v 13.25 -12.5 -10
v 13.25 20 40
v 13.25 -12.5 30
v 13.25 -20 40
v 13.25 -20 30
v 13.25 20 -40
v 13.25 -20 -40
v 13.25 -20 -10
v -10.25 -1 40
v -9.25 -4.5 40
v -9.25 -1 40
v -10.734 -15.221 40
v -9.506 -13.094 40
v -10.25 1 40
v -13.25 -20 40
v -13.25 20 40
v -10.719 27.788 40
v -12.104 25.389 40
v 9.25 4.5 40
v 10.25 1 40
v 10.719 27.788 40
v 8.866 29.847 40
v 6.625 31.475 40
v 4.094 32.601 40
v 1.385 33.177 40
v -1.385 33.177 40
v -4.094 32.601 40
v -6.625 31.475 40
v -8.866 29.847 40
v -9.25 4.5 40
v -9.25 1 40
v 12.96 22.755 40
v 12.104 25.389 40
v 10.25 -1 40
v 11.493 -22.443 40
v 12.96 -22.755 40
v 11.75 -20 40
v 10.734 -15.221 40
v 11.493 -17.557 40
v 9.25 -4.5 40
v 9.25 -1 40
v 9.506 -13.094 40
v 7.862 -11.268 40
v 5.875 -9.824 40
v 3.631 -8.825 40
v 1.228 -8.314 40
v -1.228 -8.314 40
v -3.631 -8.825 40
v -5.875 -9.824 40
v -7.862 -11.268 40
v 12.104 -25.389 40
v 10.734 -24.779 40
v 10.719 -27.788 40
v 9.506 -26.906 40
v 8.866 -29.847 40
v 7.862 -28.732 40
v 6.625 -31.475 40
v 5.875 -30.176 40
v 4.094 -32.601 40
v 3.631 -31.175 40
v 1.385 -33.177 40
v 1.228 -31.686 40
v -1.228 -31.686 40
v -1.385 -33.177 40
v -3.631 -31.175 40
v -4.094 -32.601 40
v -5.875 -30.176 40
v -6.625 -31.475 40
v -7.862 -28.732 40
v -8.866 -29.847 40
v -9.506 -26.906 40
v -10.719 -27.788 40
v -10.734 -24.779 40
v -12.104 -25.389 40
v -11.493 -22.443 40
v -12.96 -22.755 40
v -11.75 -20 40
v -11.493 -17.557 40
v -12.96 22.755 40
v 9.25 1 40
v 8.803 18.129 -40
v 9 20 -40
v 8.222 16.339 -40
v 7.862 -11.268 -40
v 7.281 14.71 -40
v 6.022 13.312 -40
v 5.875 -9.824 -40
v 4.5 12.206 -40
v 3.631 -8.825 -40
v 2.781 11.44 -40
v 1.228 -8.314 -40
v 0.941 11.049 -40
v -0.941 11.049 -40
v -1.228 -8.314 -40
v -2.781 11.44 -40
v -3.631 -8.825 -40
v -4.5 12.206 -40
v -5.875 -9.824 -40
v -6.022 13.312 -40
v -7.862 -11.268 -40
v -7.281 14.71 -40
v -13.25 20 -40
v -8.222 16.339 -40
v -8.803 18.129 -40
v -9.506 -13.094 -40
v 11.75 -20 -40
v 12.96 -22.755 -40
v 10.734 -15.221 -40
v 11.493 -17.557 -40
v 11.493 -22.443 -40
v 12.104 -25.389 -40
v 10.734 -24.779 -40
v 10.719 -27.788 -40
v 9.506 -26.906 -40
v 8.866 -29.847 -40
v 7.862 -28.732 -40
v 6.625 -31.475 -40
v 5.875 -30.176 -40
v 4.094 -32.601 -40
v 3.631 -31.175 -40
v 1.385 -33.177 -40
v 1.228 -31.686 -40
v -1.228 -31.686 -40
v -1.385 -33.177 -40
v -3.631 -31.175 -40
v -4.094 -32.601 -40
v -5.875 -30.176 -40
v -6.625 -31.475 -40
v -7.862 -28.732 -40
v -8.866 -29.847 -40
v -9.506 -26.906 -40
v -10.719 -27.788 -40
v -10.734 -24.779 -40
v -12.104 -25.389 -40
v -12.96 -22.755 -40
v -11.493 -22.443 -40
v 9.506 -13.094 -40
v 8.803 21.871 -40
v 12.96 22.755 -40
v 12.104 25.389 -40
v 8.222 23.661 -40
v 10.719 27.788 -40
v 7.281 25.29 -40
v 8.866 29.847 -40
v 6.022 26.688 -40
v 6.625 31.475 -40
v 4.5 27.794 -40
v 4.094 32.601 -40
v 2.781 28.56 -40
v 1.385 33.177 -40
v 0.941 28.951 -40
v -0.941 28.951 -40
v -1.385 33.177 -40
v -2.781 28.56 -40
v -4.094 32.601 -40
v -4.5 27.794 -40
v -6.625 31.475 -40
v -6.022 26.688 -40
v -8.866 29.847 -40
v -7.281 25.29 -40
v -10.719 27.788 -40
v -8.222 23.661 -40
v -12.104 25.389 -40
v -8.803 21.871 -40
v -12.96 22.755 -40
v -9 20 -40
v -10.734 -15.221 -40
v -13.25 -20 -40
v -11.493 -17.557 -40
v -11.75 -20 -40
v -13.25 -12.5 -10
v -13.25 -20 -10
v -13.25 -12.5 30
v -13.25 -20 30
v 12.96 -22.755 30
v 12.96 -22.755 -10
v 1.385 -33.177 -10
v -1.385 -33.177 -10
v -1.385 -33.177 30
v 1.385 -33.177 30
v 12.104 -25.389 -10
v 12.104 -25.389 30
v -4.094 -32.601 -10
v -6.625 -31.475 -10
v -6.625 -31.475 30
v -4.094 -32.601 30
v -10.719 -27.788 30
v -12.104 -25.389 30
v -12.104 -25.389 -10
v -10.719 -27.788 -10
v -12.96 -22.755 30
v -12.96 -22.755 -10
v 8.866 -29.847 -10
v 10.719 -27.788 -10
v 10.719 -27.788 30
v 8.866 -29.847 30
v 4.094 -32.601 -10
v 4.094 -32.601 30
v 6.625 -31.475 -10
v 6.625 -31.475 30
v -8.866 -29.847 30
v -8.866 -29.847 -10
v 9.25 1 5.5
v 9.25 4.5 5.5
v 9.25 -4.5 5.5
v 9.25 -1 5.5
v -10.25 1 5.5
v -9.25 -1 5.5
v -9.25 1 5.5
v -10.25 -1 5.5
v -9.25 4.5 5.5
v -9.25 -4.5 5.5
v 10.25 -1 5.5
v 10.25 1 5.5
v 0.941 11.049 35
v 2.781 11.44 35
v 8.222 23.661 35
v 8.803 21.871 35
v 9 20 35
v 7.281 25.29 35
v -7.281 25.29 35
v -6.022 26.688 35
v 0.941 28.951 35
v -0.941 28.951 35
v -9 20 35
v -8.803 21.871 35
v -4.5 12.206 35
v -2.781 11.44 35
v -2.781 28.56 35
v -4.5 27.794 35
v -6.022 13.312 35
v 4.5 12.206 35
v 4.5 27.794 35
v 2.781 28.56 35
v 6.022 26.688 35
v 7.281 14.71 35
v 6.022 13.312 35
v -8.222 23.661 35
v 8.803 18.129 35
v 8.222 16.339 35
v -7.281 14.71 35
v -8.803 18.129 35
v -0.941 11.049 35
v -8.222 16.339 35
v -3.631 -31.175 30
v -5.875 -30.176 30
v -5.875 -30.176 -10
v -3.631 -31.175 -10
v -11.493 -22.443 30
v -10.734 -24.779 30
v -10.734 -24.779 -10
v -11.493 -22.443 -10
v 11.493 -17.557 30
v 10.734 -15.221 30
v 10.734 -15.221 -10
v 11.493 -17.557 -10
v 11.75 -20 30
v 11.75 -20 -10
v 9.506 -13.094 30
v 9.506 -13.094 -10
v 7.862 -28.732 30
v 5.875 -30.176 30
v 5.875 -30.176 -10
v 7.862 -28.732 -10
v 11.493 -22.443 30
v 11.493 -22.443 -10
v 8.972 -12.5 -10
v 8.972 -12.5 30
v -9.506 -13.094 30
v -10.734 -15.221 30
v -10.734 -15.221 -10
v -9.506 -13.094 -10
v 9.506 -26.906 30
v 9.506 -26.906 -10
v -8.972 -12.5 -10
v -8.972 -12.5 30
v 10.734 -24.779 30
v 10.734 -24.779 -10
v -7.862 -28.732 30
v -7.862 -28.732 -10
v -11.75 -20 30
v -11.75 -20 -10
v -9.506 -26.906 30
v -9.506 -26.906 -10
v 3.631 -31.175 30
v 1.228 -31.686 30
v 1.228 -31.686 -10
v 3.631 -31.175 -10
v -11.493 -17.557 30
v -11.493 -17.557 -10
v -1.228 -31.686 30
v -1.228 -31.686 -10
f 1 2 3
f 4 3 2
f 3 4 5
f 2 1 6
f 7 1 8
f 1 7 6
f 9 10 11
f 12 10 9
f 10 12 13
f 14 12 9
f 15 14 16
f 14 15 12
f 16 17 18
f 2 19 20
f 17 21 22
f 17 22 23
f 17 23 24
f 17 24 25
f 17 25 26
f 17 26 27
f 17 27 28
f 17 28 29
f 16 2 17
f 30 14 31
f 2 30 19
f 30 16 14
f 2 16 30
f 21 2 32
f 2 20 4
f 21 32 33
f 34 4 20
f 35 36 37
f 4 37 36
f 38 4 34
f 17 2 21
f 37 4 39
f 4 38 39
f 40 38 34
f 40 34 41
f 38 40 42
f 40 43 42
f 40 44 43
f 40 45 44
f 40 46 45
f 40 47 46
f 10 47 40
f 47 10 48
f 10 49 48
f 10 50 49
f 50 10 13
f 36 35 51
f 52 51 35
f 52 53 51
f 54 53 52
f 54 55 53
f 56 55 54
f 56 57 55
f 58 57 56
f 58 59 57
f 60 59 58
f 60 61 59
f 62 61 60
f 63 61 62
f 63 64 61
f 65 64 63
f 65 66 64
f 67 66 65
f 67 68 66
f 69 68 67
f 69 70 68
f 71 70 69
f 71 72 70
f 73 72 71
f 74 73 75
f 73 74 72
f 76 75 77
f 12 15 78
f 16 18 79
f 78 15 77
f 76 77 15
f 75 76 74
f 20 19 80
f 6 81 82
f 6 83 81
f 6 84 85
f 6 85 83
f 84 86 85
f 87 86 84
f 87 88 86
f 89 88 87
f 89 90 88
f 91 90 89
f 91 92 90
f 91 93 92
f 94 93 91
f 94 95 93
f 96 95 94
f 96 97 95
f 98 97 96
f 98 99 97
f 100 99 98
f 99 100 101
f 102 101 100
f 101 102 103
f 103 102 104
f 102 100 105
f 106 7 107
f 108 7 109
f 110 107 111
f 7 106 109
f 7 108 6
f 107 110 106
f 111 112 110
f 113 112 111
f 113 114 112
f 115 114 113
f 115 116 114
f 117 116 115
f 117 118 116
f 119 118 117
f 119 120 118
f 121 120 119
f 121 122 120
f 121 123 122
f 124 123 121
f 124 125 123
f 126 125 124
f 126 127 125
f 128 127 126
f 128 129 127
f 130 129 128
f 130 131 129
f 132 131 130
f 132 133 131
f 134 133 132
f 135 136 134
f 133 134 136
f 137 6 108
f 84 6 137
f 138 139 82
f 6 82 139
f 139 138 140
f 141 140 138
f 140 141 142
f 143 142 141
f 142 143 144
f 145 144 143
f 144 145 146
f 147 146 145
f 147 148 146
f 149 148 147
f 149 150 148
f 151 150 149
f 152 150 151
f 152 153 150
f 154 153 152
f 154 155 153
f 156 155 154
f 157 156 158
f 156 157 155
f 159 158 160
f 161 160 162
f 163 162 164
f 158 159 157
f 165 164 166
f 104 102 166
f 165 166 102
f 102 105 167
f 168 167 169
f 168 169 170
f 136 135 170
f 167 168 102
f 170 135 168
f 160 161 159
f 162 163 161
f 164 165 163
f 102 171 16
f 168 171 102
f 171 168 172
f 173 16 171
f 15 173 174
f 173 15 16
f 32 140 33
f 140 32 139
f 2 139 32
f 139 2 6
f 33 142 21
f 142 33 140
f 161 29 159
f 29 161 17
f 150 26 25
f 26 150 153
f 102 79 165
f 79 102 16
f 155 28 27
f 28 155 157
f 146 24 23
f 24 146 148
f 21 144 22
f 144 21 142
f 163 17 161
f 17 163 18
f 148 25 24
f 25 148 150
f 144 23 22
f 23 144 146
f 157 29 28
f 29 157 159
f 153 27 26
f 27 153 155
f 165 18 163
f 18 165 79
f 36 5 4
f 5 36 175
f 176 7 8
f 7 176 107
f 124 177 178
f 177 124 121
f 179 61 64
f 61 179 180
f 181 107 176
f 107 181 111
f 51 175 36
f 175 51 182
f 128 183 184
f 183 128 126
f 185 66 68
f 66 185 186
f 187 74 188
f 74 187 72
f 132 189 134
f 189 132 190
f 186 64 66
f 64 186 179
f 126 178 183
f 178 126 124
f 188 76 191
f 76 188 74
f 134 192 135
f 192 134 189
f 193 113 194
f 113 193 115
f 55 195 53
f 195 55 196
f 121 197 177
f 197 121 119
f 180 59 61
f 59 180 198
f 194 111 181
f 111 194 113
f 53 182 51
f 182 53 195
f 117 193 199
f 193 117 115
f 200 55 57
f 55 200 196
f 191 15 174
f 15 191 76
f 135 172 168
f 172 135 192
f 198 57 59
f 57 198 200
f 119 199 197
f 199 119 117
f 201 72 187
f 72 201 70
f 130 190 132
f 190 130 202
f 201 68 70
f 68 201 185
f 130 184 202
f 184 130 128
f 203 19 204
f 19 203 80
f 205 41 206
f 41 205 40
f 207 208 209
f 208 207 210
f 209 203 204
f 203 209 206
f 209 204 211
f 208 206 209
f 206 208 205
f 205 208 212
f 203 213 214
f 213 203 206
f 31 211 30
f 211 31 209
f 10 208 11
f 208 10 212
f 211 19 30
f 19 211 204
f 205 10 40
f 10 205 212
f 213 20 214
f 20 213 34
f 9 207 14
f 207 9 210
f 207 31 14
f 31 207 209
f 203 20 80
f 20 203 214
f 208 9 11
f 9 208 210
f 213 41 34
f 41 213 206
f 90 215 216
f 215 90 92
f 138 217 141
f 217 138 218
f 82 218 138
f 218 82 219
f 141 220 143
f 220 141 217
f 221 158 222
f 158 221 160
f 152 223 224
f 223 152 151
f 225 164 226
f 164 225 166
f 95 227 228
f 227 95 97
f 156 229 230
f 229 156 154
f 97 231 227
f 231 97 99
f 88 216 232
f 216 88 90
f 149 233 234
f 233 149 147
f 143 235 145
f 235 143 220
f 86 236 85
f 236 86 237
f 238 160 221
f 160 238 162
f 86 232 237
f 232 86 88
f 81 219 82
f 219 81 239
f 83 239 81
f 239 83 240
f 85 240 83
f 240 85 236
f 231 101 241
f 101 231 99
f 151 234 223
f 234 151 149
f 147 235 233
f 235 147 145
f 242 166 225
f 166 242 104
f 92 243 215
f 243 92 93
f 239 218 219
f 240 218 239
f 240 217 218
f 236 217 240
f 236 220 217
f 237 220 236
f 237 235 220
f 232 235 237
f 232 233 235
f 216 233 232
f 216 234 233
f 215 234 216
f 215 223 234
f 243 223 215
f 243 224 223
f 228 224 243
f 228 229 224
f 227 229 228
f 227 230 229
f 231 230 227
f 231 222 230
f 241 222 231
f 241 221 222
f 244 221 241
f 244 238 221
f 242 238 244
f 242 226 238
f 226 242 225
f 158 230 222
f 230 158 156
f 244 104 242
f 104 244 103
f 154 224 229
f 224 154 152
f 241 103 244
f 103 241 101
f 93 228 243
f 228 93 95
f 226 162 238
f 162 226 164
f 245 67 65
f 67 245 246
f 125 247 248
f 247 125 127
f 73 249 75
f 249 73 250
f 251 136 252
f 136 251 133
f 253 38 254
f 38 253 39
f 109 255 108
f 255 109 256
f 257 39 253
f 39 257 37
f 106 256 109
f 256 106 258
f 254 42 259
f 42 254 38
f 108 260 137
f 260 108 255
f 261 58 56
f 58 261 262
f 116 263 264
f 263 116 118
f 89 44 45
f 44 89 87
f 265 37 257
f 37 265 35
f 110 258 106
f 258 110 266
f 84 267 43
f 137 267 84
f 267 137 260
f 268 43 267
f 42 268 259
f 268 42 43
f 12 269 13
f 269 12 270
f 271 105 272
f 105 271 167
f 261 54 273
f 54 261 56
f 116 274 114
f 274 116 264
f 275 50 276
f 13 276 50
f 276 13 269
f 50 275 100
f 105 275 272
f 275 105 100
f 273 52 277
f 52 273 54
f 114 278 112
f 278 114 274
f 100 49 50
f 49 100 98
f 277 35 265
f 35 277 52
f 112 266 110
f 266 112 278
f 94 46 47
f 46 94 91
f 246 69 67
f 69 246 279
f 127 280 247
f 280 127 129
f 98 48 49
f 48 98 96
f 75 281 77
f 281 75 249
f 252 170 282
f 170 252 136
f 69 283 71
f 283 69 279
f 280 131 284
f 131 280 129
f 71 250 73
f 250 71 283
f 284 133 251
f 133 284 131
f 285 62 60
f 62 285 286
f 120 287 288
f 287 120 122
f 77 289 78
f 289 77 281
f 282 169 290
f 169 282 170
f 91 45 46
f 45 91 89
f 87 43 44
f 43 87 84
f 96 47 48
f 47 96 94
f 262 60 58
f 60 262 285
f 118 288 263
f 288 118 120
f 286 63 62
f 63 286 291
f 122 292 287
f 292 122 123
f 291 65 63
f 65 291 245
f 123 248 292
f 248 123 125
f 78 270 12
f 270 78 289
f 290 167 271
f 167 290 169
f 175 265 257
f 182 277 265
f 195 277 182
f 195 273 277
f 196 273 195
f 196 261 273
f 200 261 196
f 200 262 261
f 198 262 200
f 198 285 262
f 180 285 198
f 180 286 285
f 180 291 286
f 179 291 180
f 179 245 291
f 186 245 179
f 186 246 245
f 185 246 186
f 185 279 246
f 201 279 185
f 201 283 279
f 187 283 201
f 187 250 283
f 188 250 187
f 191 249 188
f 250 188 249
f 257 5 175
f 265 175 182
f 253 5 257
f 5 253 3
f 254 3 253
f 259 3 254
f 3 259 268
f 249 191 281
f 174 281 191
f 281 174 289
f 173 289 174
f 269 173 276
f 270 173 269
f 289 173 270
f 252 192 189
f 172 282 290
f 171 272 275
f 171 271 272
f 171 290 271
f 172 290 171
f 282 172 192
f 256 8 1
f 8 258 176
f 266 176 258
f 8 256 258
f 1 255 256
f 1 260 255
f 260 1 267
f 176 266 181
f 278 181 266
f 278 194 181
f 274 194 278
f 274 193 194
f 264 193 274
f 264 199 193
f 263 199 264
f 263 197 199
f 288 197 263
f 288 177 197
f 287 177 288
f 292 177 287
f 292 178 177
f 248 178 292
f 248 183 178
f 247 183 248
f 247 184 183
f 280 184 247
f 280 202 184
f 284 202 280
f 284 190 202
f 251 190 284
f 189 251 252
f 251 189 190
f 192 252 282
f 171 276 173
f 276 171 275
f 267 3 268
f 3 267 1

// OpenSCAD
// file: lib/stephans.scad
module oval(length,width,height) {
  union() {
    cube([width,length,height],center=true);
    translate([0, length/2, 0]) cylinder(r=width/2, h=height, center=true);
    translate([0, -length/2, 0]) cylinder(r=width/2, h=height, center=true);
  }
}
// main file
$fs=0.1;
include <./lib/stephans.scad>;
// dna40 measurements: 20.5x33x9 board thickness: 2

/*color([0.3,0.3,0.3,0.6])*/
difference() {
  oval(40,26.5,80);
  /*translate([0,0,1]) oval(28,21,13);*/
  translate([0,20,-3]) cylinder(r=9, h=76, center=true);
  translate([0,0,23]) union() {
    cube([18.5,9,35], center=true);
    cube([20.5,2,35], center=true);
  }
  translate([0,-20,-1]) cylinder(r=11.75, h=104, center=true);
  translate([11,-25,10]) cube([200,25,40],center=true);
}
